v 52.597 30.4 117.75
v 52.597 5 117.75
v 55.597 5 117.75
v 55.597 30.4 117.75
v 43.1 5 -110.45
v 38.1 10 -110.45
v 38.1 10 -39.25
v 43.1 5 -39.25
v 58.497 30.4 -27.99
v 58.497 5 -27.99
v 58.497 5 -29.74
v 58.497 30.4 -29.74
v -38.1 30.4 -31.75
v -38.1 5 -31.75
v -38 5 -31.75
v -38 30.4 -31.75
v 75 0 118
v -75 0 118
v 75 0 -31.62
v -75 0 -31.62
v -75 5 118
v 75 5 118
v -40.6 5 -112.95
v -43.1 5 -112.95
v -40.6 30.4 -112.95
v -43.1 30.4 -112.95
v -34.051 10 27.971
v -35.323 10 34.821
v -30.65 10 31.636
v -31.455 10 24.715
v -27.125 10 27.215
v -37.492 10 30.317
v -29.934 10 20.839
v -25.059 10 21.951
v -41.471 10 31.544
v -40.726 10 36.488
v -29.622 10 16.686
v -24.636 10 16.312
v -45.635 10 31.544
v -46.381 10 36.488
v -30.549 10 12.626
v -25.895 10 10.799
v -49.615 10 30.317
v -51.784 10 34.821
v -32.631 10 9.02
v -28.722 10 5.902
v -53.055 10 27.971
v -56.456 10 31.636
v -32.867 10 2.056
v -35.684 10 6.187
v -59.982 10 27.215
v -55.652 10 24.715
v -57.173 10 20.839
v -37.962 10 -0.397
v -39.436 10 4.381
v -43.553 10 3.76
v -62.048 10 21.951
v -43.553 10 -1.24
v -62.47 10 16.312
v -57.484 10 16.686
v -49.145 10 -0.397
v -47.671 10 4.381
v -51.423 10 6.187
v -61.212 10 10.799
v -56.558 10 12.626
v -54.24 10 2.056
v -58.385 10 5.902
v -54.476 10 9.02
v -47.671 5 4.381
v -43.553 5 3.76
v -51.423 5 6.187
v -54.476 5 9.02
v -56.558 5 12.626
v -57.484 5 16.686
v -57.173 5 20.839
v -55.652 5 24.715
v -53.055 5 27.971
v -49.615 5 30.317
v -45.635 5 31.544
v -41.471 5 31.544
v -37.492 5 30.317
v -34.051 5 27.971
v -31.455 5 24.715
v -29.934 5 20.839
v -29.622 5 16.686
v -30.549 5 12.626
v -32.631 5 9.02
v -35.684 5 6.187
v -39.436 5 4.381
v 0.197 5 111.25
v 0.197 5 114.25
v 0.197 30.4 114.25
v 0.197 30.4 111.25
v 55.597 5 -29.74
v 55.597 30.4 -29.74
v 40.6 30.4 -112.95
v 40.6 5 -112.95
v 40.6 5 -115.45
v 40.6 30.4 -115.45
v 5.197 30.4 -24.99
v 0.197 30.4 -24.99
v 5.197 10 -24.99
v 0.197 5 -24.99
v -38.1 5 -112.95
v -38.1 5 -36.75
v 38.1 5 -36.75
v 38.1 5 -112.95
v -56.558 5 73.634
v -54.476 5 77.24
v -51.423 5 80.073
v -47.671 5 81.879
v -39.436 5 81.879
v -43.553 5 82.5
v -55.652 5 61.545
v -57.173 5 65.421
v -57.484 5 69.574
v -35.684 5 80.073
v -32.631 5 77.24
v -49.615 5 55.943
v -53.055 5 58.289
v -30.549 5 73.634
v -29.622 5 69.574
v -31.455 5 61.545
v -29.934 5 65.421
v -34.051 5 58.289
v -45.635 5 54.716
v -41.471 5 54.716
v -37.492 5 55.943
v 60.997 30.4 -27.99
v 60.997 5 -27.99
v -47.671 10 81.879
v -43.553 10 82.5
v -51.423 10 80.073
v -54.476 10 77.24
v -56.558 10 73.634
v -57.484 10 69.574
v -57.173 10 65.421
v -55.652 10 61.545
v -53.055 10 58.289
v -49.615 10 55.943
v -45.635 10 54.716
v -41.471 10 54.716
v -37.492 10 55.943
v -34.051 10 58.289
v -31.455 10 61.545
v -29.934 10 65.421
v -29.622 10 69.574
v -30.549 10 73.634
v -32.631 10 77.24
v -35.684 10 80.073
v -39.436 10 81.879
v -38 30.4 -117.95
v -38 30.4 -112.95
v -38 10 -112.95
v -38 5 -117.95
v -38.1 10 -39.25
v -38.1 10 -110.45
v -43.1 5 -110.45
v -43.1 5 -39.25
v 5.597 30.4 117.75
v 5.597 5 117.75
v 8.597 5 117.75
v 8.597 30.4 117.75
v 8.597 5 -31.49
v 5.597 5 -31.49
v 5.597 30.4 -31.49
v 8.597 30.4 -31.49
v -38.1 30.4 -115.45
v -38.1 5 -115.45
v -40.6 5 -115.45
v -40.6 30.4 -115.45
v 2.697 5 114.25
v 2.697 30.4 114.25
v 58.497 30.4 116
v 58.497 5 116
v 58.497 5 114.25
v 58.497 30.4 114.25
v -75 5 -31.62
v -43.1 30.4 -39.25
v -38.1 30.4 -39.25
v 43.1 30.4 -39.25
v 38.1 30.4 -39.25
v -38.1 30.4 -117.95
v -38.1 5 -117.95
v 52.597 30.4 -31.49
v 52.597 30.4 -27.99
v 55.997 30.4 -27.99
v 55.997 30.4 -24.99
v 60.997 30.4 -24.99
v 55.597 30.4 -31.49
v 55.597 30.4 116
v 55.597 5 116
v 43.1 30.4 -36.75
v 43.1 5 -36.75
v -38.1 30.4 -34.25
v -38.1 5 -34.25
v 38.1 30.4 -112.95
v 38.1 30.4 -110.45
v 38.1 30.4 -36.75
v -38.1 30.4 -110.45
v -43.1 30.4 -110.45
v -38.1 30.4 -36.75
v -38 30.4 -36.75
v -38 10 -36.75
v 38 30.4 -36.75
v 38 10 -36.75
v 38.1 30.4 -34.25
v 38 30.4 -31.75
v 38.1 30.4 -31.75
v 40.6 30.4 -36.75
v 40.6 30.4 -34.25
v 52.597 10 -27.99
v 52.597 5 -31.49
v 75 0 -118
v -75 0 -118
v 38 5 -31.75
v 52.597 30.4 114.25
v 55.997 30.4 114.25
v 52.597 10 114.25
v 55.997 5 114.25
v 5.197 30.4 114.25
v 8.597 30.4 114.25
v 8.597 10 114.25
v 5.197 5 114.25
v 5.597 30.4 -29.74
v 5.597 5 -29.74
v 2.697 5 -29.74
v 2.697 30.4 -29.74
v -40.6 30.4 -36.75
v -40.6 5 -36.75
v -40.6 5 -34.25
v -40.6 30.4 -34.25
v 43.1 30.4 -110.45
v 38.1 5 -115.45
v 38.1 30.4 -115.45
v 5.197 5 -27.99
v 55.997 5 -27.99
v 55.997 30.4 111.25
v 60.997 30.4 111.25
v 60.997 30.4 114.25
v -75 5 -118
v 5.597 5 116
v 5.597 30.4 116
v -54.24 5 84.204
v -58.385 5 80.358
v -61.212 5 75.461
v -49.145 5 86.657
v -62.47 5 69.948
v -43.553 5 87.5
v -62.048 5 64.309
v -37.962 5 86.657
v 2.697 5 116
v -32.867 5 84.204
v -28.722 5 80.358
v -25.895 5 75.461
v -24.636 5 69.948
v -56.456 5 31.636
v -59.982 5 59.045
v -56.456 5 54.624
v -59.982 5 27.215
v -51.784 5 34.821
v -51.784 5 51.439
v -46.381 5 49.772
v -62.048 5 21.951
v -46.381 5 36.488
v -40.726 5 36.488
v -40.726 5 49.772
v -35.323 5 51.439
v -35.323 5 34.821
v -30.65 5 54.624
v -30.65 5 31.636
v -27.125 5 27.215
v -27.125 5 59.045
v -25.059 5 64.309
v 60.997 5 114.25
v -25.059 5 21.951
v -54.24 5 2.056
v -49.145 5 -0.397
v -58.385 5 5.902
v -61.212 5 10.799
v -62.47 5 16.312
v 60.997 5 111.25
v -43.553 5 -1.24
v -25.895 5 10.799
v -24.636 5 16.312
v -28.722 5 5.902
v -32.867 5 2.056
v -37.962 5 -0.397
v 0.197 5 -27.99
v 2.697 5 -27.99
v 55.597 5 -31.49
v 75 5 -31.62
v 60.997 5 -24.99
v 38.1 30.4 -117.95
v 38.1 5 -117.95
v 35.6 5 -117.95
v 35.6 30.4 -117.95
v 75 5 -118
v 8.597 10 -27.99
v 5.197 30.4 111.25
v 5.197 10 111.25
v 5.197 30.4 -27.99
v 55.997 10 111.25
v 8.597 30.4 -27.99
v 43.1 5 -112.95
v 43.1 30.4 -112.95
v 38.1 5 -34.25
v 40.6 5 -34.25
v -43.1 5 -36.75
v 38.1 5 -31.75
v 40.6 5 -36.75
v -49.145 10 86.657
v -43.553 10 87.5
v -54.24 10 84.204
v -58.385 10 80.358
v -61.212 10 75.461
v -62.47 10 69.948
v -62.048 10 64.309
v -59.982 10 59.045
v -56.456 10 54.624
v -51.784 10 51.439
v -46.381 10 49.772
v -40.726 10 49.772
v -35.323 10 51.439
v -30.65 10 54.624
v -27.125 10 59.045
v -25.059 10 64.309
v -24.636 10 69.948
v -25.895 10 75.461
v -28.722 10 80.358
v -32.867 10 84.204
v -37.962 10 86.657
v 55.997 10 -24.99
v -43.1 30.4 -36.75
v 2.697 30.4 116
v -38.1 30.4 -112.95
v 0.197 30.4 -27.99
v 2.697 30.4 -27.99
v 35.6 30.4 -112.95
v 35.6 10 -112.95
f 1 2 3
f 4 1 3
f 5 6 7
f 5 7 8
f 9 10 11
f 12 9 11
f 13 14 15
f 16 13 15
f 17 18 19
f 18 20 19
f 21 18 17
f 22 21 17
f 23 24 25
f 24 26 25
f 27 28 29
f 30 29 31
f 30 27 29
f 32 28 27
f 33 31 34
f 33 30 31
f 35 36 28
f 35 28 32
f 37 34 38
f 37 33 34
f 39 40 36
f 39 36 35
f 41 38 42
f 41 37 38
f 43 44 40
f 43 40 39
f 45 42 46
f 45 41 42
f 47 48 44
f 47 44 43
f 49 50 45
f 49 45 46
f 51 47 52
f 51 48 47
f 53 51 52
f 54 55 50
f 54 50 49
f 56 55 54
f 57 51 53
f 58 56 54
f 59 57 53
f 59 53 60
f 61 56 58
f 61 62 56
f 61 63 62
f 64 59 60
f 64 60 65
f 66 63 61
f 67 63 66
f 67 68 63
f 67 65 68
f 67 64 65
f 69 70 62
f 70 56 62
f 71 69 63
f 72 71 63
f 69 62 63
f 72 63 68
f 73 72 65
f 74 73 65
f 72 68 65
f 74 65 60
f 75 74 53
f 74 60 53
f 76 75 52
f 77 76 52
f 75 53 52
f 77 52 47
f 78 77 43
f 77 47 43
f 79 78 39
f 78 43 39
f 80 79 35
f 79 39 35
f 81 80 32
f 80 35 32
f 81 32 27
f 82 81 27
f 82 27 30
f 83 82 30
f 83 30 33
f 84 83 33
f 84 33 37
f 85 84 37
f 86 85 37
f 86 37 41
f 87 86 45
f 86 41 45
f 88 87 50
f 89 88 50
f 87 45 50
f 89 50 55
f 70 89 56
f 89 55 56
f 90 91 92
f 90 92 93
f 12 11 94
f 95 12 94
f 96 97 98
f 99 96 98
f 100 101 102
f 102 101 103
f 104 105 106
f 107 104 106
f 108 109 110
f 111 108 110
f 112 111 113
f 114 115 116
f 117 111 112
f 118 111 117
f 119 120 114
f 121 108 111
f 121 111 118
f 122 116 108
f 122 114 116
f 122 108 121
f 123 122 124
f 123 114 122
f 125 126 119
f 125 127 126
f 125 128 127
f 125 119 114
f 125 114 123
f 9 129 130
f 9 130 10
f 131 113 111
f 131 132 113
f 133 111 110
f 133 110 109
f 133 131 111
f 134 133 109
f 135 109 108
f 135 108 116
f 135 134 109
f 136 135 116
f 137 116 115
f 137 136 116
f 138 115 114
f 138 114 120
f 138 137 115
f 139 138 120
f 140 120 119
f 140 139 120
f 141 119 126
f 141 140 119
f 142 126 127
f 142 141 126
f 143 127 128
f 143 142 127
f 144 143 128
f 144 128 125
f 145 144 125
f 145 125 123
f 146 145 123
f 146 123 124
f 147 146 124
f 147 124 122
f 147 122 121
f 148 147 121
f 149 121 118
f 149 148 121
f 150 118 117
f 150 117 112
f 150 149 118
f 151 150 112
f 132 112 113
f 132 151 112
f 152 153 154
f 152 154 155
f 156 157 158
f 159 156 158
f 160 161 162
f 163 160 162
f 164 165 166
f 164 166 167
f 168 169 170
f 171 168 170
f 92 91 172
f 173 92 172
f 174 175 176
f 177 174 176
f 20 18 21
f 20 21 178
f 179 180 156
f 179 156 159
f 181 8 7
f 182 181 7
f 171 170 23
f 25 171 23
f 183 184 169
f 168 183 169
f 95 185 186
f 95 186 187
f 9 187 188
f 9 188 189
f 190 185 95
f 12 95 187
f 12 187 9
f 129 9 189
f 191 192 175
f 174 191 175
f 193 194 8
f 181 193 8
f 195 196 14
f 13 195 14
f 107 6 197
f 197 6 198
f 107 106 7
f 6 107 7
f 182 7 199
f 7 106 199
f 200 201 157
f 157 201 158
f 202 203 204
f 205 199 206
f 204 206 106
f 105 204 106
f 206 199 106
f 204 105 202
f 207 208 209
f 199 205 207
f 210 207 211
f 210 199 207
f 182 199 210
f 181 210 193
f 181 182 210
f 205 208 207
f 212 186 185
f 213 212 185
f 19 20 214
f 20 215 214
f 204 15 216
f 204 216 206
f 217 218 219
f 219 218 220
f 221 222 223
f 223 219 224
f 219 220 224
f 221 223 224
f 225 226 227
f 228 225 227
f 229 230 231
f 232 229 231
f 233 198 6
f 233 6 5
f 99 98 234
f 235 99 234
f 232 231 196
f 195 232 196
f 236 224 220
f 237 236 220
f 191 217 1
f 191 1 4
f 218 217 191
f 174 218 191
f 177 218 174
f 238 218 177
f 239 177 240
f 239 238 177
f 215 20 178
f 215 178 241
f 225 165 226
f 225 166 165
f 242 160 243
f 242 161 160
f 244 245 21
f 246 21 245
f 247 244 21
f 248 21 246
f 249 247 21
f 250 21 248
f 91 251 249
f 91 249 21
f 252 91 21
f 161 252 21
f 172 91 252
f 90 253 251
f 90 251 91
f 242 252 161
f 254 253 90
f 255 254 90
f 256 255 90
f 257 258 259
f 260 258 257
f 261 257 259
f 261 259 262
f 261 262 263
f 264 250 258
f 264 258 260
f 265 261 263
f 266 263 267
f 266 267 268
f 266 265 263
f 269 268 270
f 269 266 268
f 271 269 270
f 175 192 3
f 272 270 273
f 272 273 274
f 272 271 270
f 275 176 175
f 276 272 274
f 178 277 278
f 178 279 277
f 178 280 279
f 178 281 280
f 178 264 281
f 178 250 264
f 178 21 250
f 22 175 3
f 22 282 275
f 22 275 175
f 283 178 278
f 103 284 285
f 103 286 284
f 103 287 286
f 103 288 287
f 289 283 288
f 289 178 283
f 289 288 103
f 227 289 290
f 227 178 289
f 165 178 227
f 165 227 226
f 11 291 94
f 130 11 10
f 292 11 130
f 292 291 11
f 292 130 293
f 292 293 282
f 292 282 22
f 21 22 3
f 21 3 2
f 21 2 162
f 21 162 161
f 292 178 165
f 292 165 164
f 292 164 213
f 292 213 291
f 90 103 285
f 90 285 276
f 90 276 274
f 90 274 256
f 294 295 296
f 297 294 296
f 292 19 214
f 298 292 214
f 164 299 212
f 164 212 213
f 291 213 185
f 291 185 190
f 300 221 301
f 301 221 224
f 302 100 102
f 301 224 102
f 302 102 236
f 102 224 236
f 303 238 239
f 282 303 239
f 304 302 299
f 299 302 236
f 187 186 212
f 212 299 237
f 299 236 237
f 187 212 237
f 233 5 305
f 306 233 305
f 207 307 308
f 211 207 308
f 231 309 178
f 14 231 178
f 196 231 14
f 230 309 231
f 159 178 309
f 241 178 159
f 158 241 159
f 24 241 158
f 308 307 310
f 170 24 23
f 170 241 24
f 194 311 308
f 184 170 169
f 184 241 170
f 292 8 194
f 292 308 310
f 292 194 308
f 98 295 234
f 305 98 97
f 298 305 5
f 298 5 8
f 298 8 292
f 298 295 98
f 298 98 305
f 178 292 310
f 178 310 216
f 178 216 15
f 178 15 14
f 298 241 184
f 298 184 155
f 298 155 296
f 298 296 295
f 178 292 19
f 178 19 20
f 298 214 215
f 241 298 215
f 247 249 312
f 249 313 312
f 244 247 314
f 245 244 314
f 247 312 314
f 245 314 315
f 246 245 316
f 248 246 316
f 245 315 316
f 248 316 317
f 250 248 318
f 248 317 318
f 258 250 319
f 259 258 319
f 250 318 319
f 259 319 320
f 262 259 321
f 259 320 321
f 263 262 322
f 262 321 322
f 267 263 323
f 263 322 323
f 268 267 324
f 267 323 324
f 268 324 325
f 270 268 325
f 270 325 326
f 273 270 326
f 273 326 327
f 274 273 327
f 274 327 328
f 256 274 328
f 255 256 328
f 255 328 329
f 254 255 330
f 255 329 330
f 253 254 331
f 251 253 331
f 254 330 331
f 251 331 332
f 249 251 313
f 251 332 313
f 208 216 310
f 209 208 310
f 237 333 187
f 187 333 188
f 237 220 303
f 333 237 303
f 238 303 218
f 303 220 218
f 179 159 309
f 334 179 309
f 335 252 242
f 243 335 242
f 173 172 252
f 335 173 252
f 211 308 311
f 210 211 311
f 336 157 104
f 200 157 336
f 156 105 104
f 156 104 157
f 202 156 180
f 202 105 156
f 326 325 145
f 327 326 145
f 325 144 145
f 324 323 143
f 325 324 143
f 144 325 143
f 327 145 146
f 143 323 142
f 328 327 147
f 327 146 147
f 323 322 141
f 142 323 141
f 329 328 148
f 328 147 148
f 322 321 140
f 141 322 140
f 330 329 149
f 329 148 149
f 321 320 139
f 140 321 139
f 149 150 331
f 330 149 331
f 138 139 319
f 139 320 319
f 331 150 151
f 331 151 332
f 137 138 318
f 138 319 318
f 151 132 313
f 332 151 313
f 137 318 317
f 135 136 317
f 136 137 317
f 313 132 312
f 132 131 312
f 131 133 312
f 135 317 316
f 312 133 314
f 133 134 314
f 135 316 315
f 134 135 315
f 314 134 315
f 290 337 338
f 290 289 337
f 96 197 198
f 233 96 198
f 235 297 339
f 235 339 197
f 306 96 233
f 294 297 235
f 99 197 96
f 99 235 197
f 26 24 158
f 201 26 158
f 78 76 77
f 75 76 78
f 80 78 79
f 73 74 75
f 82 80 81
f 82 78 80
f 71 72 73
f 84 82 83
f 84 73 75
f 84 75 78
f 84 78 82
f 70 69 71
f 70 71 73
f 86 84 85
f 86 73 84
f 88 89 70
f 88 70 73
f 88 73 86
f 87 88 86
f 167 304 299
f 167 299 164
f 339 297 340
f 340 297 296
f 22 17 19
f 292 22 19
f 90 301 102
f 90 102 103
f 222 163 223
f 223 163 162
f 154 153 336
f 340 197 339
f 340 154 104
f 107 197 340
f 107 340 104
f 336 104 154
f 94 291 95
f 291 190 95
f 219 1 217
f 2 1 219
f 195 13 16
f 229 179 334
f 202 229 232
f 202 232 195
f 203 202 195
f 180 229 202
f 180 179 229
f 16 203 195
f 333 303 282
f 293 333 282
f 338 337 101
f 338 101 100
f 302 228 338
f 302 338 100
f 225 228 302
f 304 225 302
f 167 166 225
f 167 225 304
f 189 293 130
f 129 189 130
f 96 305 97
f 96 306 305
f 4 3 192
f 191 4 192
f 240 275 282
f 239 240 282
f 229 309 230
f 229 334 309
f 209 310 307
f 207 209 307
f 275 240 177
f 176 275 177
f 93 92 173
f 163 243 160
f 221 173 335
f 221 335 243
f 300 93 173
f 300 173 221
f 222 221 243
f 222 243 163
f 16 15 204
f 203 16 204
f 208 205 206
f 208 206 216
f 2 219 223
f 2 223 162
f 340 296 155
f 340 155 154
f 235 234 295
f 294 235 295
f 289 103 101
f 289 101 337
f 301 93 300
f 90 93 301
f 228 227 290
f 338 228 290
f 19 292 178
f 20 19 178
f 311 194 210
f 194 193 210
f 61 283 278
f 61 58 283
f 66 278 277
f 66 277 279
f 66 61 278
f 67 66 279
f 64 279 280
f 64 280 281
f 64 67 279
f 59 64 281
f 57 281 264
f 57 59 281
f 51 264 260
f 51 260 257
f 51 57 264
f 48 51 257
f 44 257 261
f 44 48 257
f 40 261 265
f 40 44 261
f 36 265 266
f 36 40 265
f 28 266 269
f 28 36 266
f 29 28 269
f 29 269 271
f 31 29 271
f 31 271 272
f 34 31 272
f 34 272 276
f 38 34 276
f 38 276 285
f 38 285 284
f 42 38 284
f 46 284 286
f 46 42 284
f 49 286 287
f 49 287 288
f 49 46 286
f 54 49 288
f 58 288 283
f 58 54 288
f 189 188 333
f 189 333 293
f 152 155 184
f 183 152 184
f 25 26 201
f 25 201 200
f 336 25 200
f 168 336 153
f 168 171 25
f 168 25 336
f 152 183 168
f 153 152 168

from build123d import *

# Parameters (mm, degrees)
OUTLINE_W                    = 75
OUTLINE_H                    = 236
THE_FLOOR_DEPTH              = 5
CABINET_SIDE_RESTRAINT_DEPTH = 76.2
BOSS_EXTRUDE7_DEPTH          = 38
BOSS_EXTRUDE15_DEPTH         = 25.4
SIDE_RESTRAINTS_DEPTH        = 71.12
SKETCH17_W                   = 5
SKETCH17_H                   = 5
BOSS_EXTRUDE16_DEPTH         = 25
BOSS_EXTRUDE17_REACH         = 144.106
SKETCH24_W                   = 5
SKETCH24_H                   = 3
SKETCH24_W_2                 = 3
SKETCH24_H_2                 = 3.5


# Read off the part's stored shape, not the designer's step: Boss-Extrude15
with BuildPart() as part:
    # outline → the floor (new body)
    with BuildSketch(Plane(origin=(0, 0, 0), x_dir=(1, 0, 0), z_dir=(0, 1, 0))):
        with Locations((37.5, 0)):
            Rectangle(OUTLINE_W, OUTLINE_H)
        with Locations((-37.5, 0)):
            Rectangle(OUTLINE_W, OUTLINE_H)
    extrude(amount=THE_FLOOR_DEPTH)

    # Sketch7 → cabinet side restraint (add)
    with BuildSketch(Plane.XY.offset(-36.75)):
        Polygon((-38.1, 5), (-38.1, 10), (-43.1, 5), align=None)
    cabinet_side_restraint = extrude(amount=-CABINET_SIDE_RESTRAINT_DEPTH)

    # Mirror1: cabinet side restraint across plane
    add(cabinet_side_restraint.mirror(Plane(origin=(0, 0, 0), x_dir=(0, 0, 1), z_dir=(1, 0, 0))))

    # Sketch9 → Boss-Extrude7 (add, symmetric)
    with BuildSketch(Plane(origin=(0, 0, 0), x_dir=(0, 0, -1), z_dir=(1, 0, 0))):
        Polygon((112.95, 5), (117.95, 5), (112.95, 10), align=None)
    boss_extrude7 = extrude(amount=BOSS_EXTRUDE7_DEPTH, both=True)

    # Mirror2: Boss-Extrude7 across plane
    add(boss_extrude7.mirror(Plane.XY.offset(-74.85)))

    # Boss-Extrude15 outline → Boss-Extrude15 (add)
    with BuildSketch(Plane(origin=(0, 5, 0), x_dir=(1, 0, 0), z_dir=(0, 1, 0))):
        Polygon((38.1, 112.95), (38.1, 110.45), (43.1, 110.45), (43.1, 112.95), (40.6, 112.95), (40.6, 115.45), (38.1, 115.45), (38.1, 117.95), (35.6, 117.95), (35.6, 112.95), align=None)
        Polygon((43.1, 39.25), (38.1, 39.25), (38.1, 36.75), (38, 36.75), (38, 31.75), (38.1, 31.75), (38.1, 34.25), (40.6, 34.25), (40.6, 36.75), (43.1, 36.75), align=None)
        Polygon((-38.1, 112.95), (-38, 112.95), (-38, 117.95), (-38.1, 117.95), (-38.1, 115.45), (-40.6, 115.45), (-40.6, 112.95), (-43.1, 112.95), (-43.1, 110.45), (-38.1, 110.45), align=None)
        Polygon((-38, 31.75), (-38, 36.75), (-38.1, 36.75), (-38.1, 39.25), (-43.1, 39.25), (-43.1, 36.75), (-40.6, 36.75), (-40.6, 34.25), (-38.1, 34.25), (-38.1, 31.75), align=None)
    extrude(amount=BOSS_EXTRUDE15_DEPTH)

    # Sketch12 → side restraints (add, symmetric)
    with BuildSketch(Plane.XY.offset(43.13)):
        Polygon((0.197497467, 5), (5.197497467, 5), (5.197497467, 10), align=None)
    side_restraints = extrude(amount=SIDE_RESTRAINTS_DEPTH, both=True)

    # restraint mirror: side restraints across plane
    add(side_restraints.mirror(Plane(origin=(30.597497467, 0, 0), x_dir=(0, 0, 1), z_dir=(1, 0, 0))))

    # Sketch17 → Revolve1 (revolve)
    with BuildSketch(Plane.XY.offset(17.73), mode=Mode.PRIVATE) as revolve1_sk:
        with Locations((-60.023321963, 7.5)):
            Rectangle(SKETCH17_W, SKETCH17_H)
    revolve1 = revolve(revolve1_sk.sketch.rotate(Axis((-43.553321963, 5, 17.73), (0, 1, 0)), 270), axis=Axis((-43.553321963, 5, 17.73), (0, 1, 0)))

    # Mirror7: Revolve1 across plane
    add(revolve1.mirror(Plane.XY.offset(43.13)))

    # Sketch23 → Boss-Extrude16 (add, symmetric)
    with BuildSketch(Plane(origin=(30.597497467, 0, 0), x_dir=(0, 0, -1), z_dir=(1, 0, 0))):
        Polygon((27.99, 5), (27.99, 10), (31.49, 5), align=None)
    boss_extrude16 = extrude(amount=BOSS_EXTRUDE16_DEPTH, both=True)

    # Mirror10: Boss-Extrude16 across plane
    add(boss_extrude16.mirror(Plane.XY.offset(43.13)))

    # Boss-Extrude17: up to this face of the body (flat: up to its plane)
    boss_extrude17_end = Plane(part.part.faces().sort_by_distance((-40.127922078, 30.4, -37.090909091))[0])
    # Sketch24 → Boss-Extrude17 (add, up to the picked face)
    with BuildSketch(Plane(origin=(0, 5, 0), x_dir=(1, 0, 0), z_dir=(0, 1, 0)), mode=Mode.PRIVATE) as boss_extrude17_sk1:
        with Locations((2.697497467, 26.49)):
            Rectangle(SKETCH24_W, SKETCH24_H)
    boss_extrude17_tool1 = split(extrude(boss_extrude17_sk1.sketch, amount=BOSS_EXTRUDE17_REACH, mode=Mode.PRIVATE), bisect_by=boss_extrude17_end, keep=Keep.BOTH, mode=Mode.PRIVATE)
    # Sketch24 → Boss-Extrude17 (add, up to the picked face)
    with BuildSketch(Plane(origin=(0, 5, 0), x_dir=(1, 0, 0), z_dir=(0, 1, 0)), mode=Mode.PRIVATE) as boss_extrude17_sk2:
        Polygon((5.597497467, 27.99), (5.597497467, 29.74), (2.697497467, 29.74), (2.697497467, 27.99), (5.197497467, 27.99), align=None)
    boss_extrude17_tool2 = split(extrude(boss_extrude17_sk2.sketch, amount=BOSS_EXTRUDE17_REACH, mode=Mode.PRIVATE), bisect_by=boss_extrude17_end, keep=Keep.BOTH, mode=Mode.PRIVATE)
    # Sketch24 → Boss-Extrude17 (add, up to the picked face)
    with BuildSketch(Plane(origin=(0, 5, 0), x_dir=(1, 0, 0), z_dir=(0, 1, 0)), mode=Mode.PRIVATE) as boss_extrude17_sk3:
        with Locations((7.097497467, 29.74)):
            Rectangle(SKETCH24_W_2, SKETCH24_H_2)
    boss_extrude17_tool3 = split(extrude(boss_extrude17_sk3.sketch, amount=BOSS_EXTRUDE17_REACH, mode=Mode.PRIVATE), bisect_by=boss_extrude17_end, keep=Keep.BOTH, mode=Mode.PRIVATE)
    # Sketch24 → Boss-Extrude17 (add, up to the picked face)
    with BuildSketch(Plane(origin=(0, 5, 0), x_dir=(1, 0, 0), z_dir=(0, 1, 0)), mode=Mode.PRIVATE) as boss_extrude17_sk4:
        with Locations((54.097497467, 29.74)):
            Rectangle(SKETCH24_W_2, SKETCH24_H_2)
    boss_extrude17_tool4 = split(extrude(boss_extrude17_sk4.sketch, amount=BOSS_EXTRUDE17_REACH, mode=Mode.PRIVATE), bisect_by=boss_extrude17_end, keep=Keep.BOTH, mode=Mode.PRIVATE)
    # Sketch24 → Boss-Extrude17 (add, up to the picked face)
    with BuildSketch(Plane(origin=(0, 5, 0), x_dir=(1, 0, 0), z_dir=(0, 1, 0)), mode=Mode.PRIVATE) as boss_extrude17_sk5:
        Polygon((55.597497467, 29.74), (55.597497467, 27.99), (55.997497467, 27.99), (58.497497467, 27.99), (58.497497467, 29.74), align=None)
    boss_extrude17_tool5 = split(extrude(boss_extrude17_sk5.sketch, amount=BOSS_EXTRUDE17_REACH, mode=Mode.PRIVATE), bisect_by=boss_extrude17_end, keep=Keep.BOTH, mode=Mode.PRIVATE)
    # Sketch24 → Boss-Extrude17 (add, up to the picked face)
    with BuildSketch(Plane(origin=(0, 5, 0), x_dir=(1, 0, 0), z_dir=(0, 1, 0)), mode=Mode.PRIVATE) as boss_extrude17_sk6:
        with Locations((58.497497467, 26.49)):
            Rectangle(SKETCH24_W, SKETCH24_H)
    boss_extrude17_tool6 = split(extrude(boss_extrude17_sk6.sketch, amount=BOSS_EXTRUDE17_REACH, mode=Mode.PRIVATE), bisect_by=boss_extrude17_end, keep=Keep.BOTH, mode=Mode.PRIVATE)
    # Sketch24 → Boss-Extrude17 (add, up to the picked face)
    with BuildSketch(Plane(origin=(0, 5, 0), x_dir=(1, 0, 0), z_dir=(0, 1, 0)), mode=Mode.PRIVATE) as boss_extrude17_sk7:
        with Locations((58.497497467, -112.75)):
            Rectangle(SKETCH24_W, SKETCH24_H)
    boss_extrude17_tool7 = split(extrude(boss_extrude17_sk7.sketch, amount=BOSS_EXTRUDE17_REACH, mode=Mode.PRIVATE), bisect_by=boss_extrude17_end, keep=Keep.BOTH, mode=Mode.PRIVATE)
    # Sketch24 → Boss-Extrude17 (add, up to the picked face)
    with BuildSketch(Plane(origin=(0, 5, 0), x_dir=(1, 0, 0), z_dir=(0, 1, 0)), mode=Mode.PRIVATE) as boss_extrude17_sk8:
        Polygon((55.997497467, -114.25), (55.597497467, -114.25), (55.597497467, -116), (58.497497467, -116), (58.497497467, -114.25), align=None)
    boss_extrude17_tool8 = split(extrude(boss_extrude17_sk8.sketch, amount=BOSS_EXTRUDE17_REACH, mode=Mode.PRIVATE), bisect_by=boss_extrude17_end, keep=Keep.BOTH, mode=Mode.PRIVATE)
    # Sketch24 → Boss-Extrude17 (add, up to the picked face)
    with BuildSketch(Plane(origin=(0, 5, 0), x_dir=(1, 0, 0), z_dir=(0, 1, 0)), mode=Mode.PRIVATE) as boss_extrude17_sk9:
        with Locations((54.097497467, -116)):
            Rectangle(SKETCH24_W_2, SKETCH24_H_2)
    boss_extrude17_tool9 = split(extrude(boss_extrude17_sk9.sketch, amount=BOSS_EXTRUDE17_REACH, mode=Mode.PRIVATE), bisect_by=boss_extrude17_end, keep=Keep.BOTH, mode=Mode.PRIVATE)
    # Sketch24 → Boss-Extrude17 (add, up to the picked face)
    with BuildSketch(Plane(origin=(0, 5, 0), x_dir=(1, 0, 0), z_dir=(0, 1, 0)), mode=Mode.PRIVATE) as boss_extrude17_sk10:
        with Locations((7.097497467, -116)):
            Rectangle(SKETCH24_W_2, SKETCH24_H_2)
    boss_extrude17_tool10 = split(extrude(boss_extrude17_sk10.sketch, amount=BOSS_EXTRUDE17_REACH, mode=Mode.PRIVATE), bisect_by=boss_extrude17_end, keep=Keep.BOTH, mode=Mode.PRIVATE)
    # Sketch24 → Boss-Extrude17 (add, up to the picked face)
    with BuildSketch(Plane(origin=(0, 5, 0), x_dir=(1, 0, 0), z_dir=(0, 1, 0)), mode=Mode.PRIVATE) as boss_extrude17_sk11:
        Polygon((5.597497467, -116), (5.597497467, -114.25), (5.197497467, -114.25), (2.697497467, -114.25), (2.697497467, -116), align=None)
    boss_extrude17_tool11 = split(extrude(boss_extrude17_sk11.sketch, amount=BOSS_EXTRUDE17_REACH, mode=Mode.PRIVATE), bisect_by=boss_extrude17_end, keep=Keep.BOTH, mode=Mode.PRIVATE)
    # Sketch24 → Boss-Extrude17 (add, up to the picked face)
    with BuildSketch(Plane(origin=(0, 5, 0), x_dir=(1, 0, 0), z_dir=(0, 1, 0)), mode=Mode.PRIVATE) as boss_extrude17_sk12:
        with Locations((2.697497467, -112.75)):
            Rectangle(SKETCH24_W, SKETCH24_H)
    boss_extrude17_tool12 = split(extrude(boss_extrude17_sk12.sketch, amount=BOSS_EXTRUDE17_REACH, mode=Mode.PRIVATE), bisect_by=boss_extrude17_end, keep=Keep.BOTH, mode=Mode.PRIVATE)
    add(boss_extrude17_tool1.solids().sort_by(Axis((2.697497, 5, -26.49), (0, 1, 0)))[0])
    add(boss_extrude17_tool2.solids().sort_by(Axis((4.147497, 5, -28.865), (0, 1, 0)))[0])
    add(boss_extrude17_tool3.solids().sort_by(Axis((7.097497, 5, -29.74), (0, 1, 0)))[0])
    add(boss_extrude17_tool4.solids().sort_by(Axis((54.097497, 5, -29.74), (0, 1, 0)))[0])
    add(boss_extrude17_tool5.solids().sort_by(Axis((57.047497, 5, -28.865), (0, 1, 0)))[0])
    add(boss_extrude17_tool6.solids().sort_by(Axis((58.497497, 5, -26.49), (0, 1, 0)))[0])
    add(boss_extrude17_tool7.solids().sort_by(Axis((58.497497, 5, 112.75), (0, 1, 0)))[0])
    add(boss_extrude17_tool8.solids().sort_by(Axis((57.047497, 5, 115.125), (0, 1, 0)))[0])
    add(boss_extrude17_tool9.solids().sort_by(Axis((54.097497, 5, 116), (0, 1, 0)))[0])
    add(boss_extrude17_tool10.solids().sort_by(Axis((7.097497, 5, 116), (0, 1, 0)))[0])
    add(boss_extrude17_tool11.solids().sort_by(Axis((4.147497, 5, 115.125), (0, 1, 0)))[0])
    add(boss_extrude17_tool12.solids().sort_by(Axis((2.697497, 5, 112.75), (0, 1, 0)))[0])


with BuildPart() as body_2:
    # Split1: the piece on the far side of the plane
    add(part.part)
    split(bisect_by=Plane(origin=(0, 0, -31.62), x_dir=(-1, 0, 0), z_dir=(0, 0, -1)), keep=Keep.BOTTOM)


with BuildPart() as part_1:
    add(part.part)

    # Split1
    split(bisect_by=Plane(origin=(0, 0, -31.62), x_dir=(-1, 0, 0), z_dir=(0, 0, -1)), keep=Keep.TOP)


solid = Compound([body_2.part, part_1.part])
